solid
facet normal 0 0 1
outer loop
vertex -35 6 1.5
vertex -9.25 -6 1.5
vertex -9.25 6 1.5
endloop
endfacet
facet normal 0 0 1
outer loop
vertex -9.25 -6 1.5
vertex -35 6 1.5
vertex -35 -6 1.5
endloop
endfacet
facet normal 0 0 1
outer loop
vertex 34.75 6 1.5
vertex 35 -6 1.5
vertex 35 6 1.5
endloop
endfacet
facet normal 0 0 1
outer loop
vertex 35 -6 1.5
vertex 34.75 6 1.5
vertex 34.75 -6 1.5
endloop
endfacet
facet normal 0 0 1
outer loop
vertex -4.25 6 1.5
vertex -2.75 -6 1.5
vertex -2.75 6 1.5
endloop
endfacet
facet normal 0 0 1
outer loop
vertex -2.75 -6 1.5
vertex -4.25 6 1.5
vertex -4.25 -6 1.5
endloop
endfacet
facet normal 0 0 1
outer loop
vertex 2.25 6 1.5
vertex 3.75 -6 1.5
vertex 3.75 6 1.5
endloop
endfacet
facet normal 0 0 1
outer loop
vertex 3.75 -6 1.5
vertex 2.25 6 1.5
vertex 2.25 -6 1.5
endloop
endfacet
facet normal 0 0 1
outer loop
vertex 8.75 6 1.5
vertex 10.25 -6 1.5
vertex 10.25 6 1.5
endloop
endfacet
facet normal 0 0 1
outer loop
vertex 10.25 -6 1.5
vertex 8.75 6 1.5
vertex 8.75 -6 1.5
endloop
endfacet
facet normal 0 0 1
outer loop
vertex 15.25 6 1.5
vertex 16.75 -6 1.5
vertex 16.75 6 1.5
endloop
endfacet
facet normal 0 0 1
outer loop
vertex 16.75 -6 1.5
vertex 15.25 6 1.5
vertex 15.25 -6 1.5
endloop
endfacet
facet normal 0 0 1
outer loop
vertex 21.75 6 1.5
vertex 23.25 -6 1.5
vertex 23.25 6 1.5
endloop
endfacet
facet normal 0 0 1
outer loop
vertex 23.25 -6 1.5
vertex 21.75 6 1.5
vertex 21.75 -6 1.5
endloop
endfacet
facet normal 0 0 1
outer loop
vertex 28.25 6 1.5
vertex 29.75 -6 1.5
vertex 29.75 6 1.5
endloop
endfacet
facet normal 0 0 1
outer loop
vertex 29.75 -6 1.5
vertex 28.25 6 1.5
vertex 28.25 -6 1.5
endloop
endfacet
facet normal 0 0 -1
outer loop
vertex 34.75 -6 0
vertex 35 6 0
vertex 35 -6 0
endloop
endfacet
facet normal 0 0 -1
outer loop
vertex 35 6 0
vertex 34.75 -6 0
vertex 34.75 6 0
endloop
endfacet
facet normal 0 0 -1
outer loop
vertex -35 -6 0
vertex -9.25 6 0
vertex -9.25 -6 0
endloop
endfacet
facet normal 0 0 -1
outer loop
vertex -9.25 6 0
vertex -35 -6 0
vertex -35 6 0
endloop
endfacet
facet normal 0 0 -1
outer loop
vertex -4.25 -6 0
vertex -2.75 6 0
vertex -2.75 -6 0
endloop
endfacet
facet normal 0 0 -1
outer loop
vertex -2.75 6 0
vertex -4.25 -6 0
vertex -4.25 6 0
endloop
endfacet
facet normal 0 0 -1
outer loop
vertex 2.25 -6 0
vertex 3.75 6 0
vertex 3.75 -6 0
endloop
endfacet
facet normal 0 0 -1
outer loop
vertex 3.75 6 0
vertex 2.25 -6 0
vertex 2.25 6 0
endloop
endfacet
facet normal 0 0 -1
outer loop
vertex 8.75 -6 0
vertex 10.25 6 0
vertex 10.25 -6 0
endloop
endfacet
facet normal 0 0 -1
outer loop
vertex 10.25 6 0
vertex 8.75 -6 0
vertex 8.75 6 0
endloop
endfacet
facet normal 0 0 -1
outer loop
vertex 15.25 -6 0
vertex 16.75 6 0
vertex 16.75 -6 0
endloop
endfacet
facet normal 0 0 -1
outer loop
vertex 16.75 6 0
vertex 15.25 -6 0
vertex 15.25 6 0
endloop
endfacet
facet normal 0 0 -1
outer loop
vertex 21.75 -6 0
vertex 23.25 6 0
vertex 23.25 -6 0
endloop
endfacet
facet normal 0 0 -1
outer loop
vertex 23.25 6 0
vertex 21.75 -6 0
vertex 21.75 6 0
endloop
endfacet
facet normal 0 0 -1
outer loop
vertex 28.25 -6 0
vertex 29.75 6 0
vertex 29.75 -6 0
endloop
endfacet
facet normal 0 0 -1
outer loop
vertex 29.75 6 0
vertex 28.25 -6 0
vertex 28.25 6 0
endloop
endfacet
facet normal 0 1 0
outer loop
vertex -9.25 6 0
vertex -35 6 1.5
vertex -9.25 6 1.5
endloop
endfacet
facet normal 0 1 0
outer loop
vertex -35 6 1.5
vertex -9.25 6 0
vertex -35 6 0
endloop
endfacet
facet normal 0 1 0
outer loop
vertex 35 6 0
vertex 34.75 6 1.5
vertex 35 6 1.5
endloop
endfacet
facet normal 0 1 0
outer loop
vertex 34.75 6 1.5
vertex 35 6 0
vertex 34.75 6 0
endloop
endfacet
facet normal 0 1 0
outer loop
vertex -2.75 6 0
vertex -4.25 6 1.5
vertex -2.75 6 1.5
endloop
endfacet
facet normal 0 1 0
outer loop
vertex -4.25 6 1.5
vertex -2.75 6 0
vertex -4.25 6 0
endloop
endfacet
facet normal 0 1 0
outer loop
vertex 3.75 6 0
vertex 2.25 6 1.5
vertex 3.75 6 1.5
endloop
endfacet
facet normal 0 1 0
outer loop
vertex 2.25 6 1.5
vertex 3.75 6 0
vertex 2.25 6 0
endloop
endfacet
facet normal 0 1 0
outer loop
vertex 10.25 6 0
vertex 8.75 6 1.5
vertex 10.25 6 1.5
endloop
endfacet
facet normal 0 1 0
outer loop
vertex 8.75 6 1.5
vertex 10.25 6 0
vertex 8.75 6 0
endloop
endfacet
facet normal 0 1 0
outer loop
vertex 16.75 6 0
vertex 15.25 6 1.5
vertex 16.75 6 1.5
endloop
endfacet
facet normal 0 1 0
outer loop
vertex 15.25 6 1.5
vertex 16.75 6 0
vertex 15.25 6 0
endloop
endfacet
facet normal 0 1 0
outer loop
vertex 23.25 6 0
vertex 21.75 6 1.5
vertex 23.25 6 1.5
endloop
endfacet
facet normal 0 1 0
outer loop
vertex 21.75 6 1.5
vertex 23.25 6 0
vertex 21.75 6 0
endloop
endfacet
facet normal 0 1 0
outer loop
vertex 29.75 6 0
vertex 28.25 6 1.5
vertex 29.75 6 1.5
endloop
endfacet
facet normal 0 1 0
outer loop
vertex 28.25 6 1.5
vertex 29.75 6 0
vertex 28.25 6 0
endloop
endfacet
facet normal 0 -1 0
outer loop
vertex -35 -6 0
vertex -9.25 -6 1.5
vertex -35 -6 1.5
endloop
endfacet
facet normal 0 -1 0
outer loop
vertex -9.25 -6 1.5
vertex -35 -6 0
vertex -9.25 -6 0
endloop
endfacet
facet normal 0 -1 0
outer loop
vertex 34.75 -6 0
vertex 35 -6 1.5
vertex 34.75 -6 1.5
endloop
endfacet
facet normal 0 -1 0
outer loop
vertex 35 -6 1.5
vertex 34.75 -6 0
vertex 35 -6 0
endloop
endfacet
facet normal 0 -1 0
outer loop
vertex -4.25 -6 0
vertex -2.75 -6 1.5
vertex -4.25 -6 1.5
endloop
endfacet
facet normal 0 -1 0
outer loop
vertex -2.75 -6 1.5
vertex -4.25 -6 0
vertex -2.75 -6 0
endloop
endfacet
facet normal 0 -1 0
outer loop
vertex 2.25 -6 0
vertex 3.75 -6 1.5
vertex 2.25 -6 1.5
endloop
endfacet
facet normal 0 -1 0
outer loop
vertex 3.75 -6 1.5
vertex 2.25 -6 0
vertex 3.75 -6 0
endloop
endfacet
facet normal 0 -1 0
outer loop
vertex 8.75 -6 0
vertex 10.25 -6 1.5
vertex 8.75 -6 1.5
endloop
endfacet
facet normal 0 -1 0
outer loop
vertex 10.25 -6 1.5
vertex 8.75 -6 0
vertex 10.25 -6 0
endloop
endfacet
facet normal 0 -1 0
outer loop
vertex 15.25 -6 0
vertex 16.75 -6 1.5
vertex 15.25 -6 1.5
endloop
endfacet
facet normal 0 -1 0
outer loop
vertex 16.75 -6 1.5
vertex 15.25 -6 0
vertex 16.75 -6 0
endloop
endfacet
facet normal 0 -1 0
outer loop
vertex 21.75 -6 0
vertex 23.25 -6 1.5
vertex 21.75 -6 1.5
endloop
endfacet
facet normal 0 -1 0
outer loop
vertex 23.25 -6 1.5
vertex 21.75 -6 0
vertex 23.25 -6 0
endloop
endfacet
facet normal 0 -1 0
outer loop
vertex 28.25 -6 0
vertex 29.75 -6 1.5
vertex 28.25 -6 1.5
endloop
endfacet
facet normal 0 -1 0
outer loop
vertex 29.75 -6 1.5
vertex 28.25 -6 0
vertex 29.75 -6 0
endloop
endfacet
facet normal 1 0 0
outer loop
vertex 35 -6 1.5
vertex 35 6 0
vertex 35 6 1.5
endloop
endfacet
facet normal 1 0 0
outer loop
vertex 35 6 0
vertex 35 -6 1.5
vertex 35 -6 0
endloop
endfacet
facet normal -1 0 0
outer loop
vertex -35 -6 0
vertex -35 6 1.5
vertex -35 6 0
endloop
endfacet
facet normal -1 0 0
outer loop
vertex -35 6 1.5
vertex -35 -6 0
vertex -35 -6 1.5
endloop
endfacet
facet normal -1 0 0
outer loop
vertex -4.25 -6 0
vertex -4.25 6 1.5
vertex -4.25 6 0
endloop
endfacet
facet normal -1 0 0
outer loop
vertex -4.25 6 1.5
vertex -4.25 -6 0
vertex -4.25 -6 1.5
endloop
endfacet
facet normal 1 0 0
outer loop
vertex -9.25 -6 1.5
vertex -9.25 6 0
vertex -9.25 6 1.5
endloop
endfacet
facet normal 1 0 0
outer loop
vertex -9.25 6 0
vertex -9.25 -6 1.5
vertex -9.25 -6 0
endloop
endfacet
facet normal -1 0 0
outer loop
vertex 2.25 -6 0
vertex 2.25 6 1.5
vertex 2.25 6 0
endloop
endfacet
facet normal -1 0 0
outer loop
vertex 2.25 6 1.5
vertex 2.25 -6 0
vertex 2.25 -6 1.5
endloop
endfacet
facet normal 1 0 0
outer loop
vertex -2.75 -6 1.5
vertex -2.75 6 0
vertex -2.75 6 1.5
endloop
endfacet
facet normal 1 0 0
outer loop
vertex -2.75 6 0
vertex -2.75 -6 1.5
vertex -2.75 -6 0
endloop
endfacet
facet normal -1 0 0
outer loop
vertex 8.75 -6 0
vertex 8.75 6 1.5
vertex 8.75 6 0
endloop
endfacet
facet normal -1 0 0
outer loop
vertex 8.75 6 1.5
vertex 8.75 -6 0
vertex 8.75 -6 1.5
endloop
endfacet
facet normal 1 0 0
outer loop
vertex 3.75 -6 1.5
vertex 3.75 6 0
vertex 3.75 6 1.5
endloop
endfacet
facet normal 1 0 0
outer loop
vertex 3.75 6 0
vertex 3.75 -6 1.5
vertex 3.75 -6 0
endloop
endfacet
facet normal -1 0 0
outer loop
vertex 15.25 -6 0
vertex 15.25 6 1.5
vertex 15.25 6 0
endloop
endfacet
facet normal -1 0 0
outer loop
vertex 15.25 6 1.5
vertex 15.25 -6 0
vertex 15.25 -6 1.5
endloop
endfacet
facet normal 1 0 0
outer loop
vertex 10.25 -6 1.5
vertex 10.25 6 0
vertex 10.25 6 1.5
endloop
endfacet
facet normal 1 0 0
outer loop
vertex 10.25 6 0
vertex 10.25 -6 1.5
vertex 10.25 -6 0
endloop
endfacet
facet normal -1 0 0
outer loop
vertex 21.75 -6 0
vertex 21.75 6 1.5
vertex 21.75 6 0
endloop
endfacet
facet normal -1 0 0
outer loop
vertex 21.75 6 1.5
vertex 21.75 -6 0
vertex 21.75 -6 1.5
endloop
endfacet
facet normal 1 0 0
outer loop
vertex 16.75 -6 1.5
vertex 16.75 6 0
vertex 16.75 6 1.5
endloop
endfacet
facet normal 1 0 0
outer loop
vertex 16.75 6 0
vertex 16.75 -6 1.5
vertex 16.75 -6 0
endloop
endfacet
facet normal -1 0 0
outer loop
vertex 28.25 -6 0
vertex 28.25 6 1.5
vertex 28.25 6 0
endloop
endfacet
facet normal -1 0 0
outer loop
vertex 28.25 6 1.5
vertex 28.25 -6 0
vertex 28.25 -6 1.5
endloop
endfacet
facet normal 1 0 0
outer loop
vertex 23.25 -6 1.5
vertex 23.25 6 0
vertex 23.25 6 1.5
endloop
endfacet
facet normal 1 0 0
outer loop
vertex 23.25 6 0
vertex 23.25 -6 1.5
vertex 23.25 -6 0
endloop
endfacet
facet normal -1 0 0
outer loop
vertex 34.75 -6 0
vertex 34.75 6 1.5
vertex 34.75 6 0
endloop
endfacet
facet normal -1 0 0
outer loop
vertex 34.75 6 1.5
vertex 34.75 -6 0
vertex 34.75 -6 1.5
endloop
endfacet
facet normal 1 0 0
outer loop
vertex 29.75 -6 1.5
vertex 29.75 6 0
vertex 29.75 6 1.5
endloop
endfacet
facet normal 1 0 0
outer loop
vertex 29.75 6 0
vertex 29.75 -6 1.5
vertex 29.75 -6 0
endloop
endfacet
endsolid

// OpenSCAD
// 10-well agarose gel comb - printed lying flat
// Units: mm

// ---------- Parameters ----------
plate_t      = 1.5;    // plate thickness (Z)
spine_l      = 70;     // spine length (X)
spine_w      = 12;     // spine width (Y)
tooth_n      = 10;     // number of teeth
tooth_w      = 5.0;    // tooth width (X)
tooth_h      = 12;     // tooth length (Y)
gap          = 1.5;    // gap between teeth (X)
eps          = 0.5;    // cutter overshoot past faces

$fn = 64;

// ---------- Derived ----------
pitch   = tooth_w + gap;
x0      = -(tooth_n - 1) * gap / 2;   // first tooth left edge (row centred)
y_tooth = -tooth_h / 2;               // tooth extends into -Y

// ---------- Model ----------
difference() {
    // Plate with spine and teeth
    union() {
        translate([-spine_l / 2, -spine_w / 2, 0])
            cube([spine_l, spine_w, plate_t]);
        for (i = [0 : tooth_n - 1])
            translate([x0 + i * pitch - tooth_w / 2, y_tooth, 0])
                cube([tooth_w, tooth_h, plate_t]);
    }

    // Cut out the wells through the full thickness
    for (i = [0 : tooth_n - 1])
        translate([x0 + i * pitch - tooth_w / 2, y_tooth - eps, -eps])
            cube([tooth_w, tooth_h + 2 * eps, plate_t + 2 * eps]);
}
